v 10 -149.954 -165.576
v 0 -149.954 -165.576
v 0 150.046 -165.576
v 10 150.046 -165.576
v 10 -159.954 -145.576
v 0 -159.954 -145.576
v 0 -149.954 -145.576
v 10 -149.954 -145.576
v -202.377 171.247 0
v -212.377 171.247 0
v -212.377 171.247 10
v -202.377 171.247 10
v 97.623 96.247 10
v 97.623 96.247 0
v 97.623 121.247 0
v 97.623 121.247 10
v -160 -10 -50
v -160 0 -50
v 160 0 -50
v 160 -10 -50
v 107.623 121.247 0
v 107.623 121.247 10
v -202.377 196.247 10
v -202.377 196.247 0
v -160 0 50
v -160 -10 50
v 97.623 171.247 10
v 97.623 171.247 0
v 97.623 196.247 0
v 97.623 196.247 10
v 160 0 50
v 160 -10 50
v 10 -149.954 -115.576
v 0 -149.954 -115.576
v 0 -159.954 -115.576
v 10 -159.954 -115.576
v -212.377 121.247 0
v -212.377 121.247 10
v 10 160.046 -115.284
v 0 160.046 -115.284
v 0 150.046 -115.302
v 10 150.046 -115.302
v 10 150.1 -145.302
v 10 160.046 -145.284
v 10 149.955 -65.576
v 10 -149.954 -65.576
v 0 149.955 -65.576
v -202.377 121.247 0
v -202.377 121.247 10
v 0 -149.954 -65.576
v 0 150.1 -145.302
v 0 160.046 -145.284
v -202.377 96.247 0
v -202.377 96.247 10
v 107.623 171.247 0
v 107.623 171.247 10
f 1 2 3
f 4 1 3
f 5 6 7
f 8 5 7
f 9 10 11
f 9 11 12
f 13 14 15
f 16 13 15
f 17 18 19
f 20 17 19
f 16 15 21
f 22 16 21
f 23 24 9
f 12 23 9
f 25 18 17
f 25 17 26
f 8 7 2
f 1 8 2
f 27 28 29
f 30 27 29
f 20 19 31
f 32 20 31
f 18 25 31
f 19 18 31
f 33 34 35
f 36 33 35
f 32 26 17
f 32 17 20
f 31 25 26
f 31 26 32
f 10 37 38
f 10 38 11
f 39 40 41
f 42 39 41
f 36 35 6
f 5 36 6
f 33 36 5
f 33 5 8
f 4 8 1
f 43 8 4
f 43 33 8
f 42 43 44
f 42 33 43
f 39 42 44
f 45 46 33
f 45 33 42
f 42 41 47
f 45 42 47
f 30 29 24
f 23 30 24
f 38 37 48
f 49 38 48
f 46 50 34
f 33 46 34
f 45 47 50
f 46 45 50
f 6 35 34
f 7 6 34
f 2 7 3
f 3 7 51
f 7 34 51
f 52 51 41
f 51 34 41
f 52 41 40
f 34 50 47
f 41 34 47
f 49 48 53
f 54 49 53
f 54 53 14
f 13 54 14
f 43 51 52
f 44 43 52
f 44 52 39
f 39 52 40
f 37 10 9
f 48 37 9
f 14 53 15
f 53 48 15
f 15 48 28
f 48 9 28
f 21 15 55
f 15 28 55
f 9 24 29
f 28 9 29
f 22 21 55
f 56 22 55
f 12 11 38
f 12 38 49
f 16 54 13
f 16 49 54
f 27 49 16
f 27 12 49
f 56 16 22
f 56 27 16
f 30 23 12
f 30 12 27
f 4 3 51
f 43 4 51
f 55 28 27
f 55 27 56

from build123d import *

# Parameters (mm, degrees)
F0_W     = 320
F0_H     = 100
F1_DEPTH = 10
F2_W     = 10
F2_H     = 50
F3_DEPTH = 10
F5_DEPTH = 10


# Not quite as in the source:
# - a feature names something its author has since deleted; it is built from what else it names


with BuildPart() as f1:
    # F0 (on Front) → F1 (new body)
    with BuildSketch(Plane.XZ):
        Rectangle(F0_W, F0_H)
    extrude(amount=F1_DEPTH)


with BuildPart() as f3:
    # F2 (on Top) → F3 (new body)
    with BuildSketch(Plane.XY):
        Polygon((-202.3773396015, 96.2469950318), (97.6226603985, 96.2469950318), (97.6226603985, 121.2469950318), (97.6226603985, 171.2469950318), (97.6226603985, 196.2469950318), (-202.3773396015, 196.2469950318), (-202.3773396015, 171.2469950318), (-202.3773396015, 121.2469950318), align=None)
        with Locations((-207.3773396015, 146.2469950318)):
            Rectangle(F2_W, F2_H)
        with Locations((102.6226603985, 146.2469950318)):
            Rectangle(F2_W, F2_H)
    extrude(amount=F3_DEPTH)


with BuildPart() as f5:
    # F4 (on Right) → F5 (new body)
    with BuildSketch(Plane.YZ):
        Polygon((-149.9543616176, -165.5762195587), (150.0456550453, -165.5762195587), (150.1001544525, -145.3023395036), (160.0456383824, -145.2841836565), (160.0456383824, -115.2841341545), (150.0456550453, -115.3023894922), (149.9546114852, -65.5762195587), (-149.9543616176, -65.5762195587), (-149.9543616176, -115.5762195587), (-159.9543616176, -115.5762195587), (-159.9543616176, -145.5762195587), (-149.9543616176, -145.5762195587), align=None)
    extrude(amount=F5_DEPTH)


solid = Compound([f1.part, f3.part, f5.part])
